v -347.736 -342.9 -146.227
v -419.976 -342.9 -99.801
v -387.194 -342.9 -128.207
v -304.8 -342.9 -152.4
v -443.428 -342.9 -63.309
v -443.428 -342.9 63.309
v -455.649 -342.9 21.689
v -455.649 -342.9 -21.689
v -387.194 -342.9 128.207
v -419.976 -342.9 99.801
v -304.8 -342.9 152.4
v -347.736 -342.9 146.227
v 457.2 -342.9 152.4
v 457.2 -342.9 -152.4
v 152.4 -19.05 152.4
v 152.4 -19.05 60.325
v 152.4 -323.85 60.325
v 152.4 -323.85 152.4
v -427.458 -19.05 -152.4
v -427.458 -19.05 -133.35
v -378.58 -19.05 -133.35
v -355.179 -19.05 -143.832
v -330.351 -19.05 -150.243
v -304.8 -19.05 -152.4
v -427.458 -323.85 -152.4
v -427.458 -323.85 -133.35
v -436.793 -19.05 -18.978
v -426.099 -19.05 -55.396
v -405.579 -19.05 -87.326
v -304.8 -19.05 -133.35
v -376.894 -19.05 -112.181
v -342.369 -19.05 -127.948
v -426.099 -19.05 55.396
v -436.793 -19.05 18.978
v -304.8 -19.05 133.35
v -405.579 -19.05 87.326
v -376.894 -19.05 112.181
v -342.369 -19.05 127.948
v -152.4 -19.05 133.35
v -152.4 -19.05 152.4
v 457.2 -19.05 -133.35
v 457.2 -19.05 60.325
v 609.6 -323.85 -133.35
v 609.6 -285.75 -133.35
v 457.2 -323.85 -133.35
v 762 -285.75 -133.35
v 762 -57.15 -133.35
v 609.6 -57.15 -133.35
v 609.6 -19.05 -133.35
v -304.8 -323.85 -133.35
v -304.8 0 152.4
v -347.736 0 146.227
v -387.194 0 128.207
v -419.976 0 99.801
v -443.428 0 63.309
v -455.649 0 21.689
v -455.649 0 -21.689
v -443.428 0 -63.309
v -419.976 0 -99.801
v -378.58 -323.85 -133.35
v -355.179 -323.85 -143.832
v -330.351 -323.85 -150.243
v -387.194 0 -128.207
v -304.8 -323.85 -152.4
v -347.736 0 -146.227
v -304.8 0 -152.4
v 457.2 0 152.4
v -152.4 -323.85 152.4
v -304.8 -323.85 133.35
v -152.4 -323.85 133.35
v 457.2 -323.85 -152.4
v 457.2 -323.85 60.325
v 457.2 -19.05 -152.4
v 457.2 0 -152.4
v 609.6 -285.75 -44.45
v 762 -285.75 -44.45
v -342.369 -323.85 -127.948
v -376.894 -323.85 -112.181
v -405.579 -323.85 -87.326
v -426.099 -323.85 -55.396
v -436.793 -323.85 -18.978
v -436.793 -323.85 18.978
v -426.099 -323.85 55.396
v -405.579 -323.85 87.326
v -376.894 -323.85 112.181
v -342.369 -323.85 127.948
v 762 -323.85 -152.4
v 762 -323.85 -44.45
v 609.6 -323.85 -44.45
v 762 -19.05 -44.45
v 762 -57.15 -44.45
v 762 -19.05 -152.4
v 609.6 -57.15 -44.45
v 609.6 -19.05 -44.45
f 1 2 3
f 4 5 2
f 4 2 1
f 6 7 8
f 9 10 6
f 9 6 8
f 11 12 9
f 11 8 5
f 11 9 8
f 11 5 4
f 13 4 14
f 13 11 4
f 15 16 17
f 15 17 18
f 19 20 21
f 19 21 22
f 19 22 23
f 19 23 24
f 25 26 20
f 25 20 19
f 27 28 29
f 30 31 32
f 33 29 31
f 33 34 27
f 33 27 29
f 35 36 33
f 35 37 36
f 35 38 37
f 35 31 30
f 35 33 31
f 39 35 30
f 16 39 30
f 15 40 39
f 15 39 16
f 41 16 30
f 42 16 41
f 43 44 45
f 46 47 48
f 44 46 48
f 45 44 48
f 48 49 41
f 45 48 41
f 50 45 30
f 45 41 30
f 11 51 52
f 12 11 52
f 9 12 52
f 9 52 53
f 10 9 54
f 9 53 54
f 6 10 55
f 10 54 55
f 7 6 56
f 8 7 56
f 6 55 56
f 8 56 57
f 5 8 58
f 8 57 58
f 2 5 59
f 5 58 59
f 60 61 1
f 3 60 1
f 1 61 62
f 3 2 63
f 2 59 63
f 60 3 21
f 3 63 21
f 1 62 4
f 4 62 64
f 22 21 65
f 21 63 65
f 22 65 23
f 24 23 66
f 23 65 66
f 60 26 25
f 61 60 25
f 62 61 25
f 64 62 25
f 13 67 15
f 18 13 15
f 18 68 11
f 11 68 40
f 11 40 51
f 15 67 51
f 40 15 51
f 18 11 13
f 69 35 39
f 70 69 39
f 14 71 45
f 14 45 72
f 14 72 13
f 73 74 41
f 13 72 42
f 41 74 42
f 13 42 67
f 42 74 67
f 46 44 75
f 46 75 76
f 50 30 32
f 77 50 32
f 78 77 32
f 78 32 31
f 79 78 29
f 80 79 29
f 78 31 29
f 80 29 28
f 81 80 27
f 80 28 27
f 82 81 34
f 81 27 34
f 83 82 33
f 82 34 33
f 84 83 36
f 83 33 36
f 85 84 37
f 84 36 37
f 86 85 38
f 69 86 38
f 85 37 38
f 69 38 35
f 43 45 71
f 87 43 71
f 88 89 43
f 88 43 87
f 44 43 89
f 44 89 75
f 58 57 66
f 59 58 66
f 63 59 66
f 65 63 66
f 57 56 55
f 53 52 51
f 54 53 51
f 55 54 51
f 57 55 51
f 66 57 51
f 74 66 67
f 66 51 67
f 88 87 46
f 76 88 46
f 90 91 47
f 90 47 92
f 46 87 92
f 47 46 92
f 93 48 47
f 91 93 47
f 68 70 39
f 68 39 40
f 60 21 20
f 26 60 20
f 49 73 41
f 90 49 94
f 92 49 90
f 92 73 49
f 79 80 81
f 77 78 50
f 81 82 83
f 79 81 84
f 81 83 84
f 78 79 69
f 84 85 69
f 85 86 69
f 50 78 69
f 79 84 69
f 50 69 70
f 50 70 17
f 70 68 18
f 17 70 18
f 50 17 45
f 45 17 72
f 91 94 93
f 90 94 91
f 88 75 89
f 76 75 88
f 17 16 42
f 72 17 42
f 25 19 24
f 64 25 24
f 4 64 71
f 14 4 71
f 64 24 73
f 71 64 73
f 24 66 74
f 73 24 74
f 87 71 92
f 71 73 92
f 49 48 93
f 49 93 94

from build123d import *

# Parameters (mm, degrees)
F1_DEPTH = 19.05
F2_W     = 304.8
F2_H     = 92.075
F3_DEPTH = 304.8
F4_W     = 304.8
F4_H     = 92.075
F5_DEPTH = 19.05
F6_W     = 304.8
F6_H     = 19.05
F7_DEPTH = 304.8
F8_W     = 152.4
F8_H     = 38.1
F9_DEPTH = 88.9


# Not quite as in the source:
# - a feature names something its author has since deleted; it is built from what else it names


with BuildPart() as f1:
    # F0 (on Front) → F1 (new body)
    with BuildSketch(Plane.XZ):
        with BuildLine():
            Line((457.2, -152.4), (457.2, 152.4))
            Line((457.2, 152.4), (-304.8, 152.4))
            ThreePointArc((-304.8, 152.4), (-197.0369265472, 107.7630734528), (-152.4, 0))
            ThreePointArc((-152.4, 0), (-197.0369262947, -107.7630732004), (-304.799999286, -152.4))
            Line((-304.799999286, -152.4), (457.2, -152.4))
        make_face()
        with BuildLine():
            ThreePointArc((-152.4, 0), (-197.0369265472, 107.7630734528), (-304.8, 152.4))
            ThreePointArc((-304.8, 152.4), (-412.5630734984, 107.7630734073), (-457.2, -1.288e-07))
            ThreePointArc((-457.2, -1.288e-07), (-412.5630731549, -107.7630737508), (-304.799999286, -152.4))
            ThreePointArc((-304.799999286, -152.4), (-197.0369262947, -107.7630732004), (-152.4, 0))
        make_face()
    extrude(amount=F1_DEPTH)

    # F2 (on face) → F3 (join)
    with BuildSketch(Plane.XZ.offset(19.05)):
        with Locations((304.8, 106.3625)):
            Rectangle(F2_W, F2_H)
    extrude(amount=F3_DEPTH)

    # F4 (on face) → F5 (join)
    with BuildSketch(Plane.XZ.offset(323.85)):
        with BuildLine():
            Line((152.4, 60.325), (152.4, 152.4))
            Line((152.4, 152.4), (-304.8, 152.4))
            ThreePointArc((-304.8, 152.4), (-197.0369265472, 107.7630734528), (-152.4, 0))
            ThreePointArc((-152.4, 0), (-197.0369262947, -107.7630732004), (-304.799999286, -152.4))
            Line((-304.799999286, -152.4), (457.2, -152.4))
            Line((457.2, -152.4), (457.2, 60.325))
            Line((457.2, 60.325), (152.4, 60.325))
        make_face()
        with Locations((304.8, 106.3625)):
            Rectangle(F4_W, F4_H)
        with BuildLine():
            ThreePointArc((-152.4, 0), (-197.0369265472, 107.7630734528), (-304.8, 152.4))
            ThreePointArc((-304.8, 152.4), (-412.5630734984, 107.7630734073), (-457.2, -1.288e-07))
            ThreePointArc((-457.2, -1.288e-07), (-412.5630731549, -107.7630737508), (-304.799999286, -152.4))
            ThreePointArc((-304.799999286, -152.4), (-197.0369262947, -107.7630732004), (-152.4, 0))
        make_face()
    extrude(amount=F5_DEPTH)

    # F6 (on face) → F7 (join, through all)
    with BuildSketch(Plane.XZ.offset(19.05)):
        with BuildLine():
            ThreePointArc((-304.799999286, -152.4), (-342.8999996543, -147.5606655798), (-378.5803327453, -133.35))
            Line((-378.5803327453, -133.35), (-427.4579864061, -133.35))
            Line((-427.4579864061, -133.35), (-427.4579864061, -152.4))
            Line((-427.4579864061, -152.4), (-304.799999286, -152.4))
        make_face()
        with BuildLine():
            Line((-152.4, 133.35), (-152.4, 152.4))
            Line((-152.4, 152.4), (-304.8, 152.4))
            ThreePointArc((-304.8, 152.4), (-266.7, 147.5606654905), (-231.0196672547, 133.35))
            Line((-231.0196672547, 133.35), (-152.4, 133.35))
        make_face()
        with BuildLine():
            ThreePointArc((-231.0196672547, 133.35), (-266.7, 147.5606654905), (-304.8, 152.4))
            Line((-304.8, 152.4), (-304.8, 133.35))
            Line((-304.8, 133.35), (-231.0196672547, 133.35))
        make_face()
        with BuildLine():
            Line((-304.8, 133.35), (-304.8, 152.4))
            ThreePointArc((-304.8, 152.4), (-452.3606654905, 38.1), (-378.5803327453, -133.35))
            Line((-378.5803327453, -133.35), (-304.7999985066, -133.35))
            ThreePointArc((-304.7999985066, -133.35), (-438.15, -7.467e-07), (-304.8, 133.35))
        make_face()
        with BuildLine():
            Line((-304.7999985066, -133.35), (-378.5803327453, -133.35))
            ThreePointArc((-378.5803327453, -133.35), (-342.8999996543, -147.5606655798), (-304.799999286, -152.4))
            ThreePointArc((-304.799999286, -152.4), (-266.6999996543, -147.5606654012), (-231.0196672547, -133.35))
            Line((-231.0196672547, -133.35), (-304.7999985066, -133.35))
        make_face()
        with Locations((609.6, -142.875)):
            Rectangle(F6_W, F6_H)
        with BuildLine():
            ThreePointArc((-231.0196672547, -133.35), (-266.6999996543, -147.5606654012), (-304.799999286, -152.4))
            Line((-304.799999286, -152.4), (457.2, -152.4))
            Line((457.2, -152.4), (457.2, -133.35))
            Line((457.2, -133.35), (-231.0196672547, -133.35))
        make_face()
    extrude(amount=F7_DEPTH)

    # F8 (on face) → F9 (join)
    with BuildSketch(Plane.XY.offset(-133.35)):
        with Locations((685.8, -38.1)):
            Rectangle(F8_W, F8_H)
        with Locations((685.8, -304.8)):
            Rectangle(F8_W, F8_H)
    extrude(amount=F9_DEPTH)


solid = f1.part
